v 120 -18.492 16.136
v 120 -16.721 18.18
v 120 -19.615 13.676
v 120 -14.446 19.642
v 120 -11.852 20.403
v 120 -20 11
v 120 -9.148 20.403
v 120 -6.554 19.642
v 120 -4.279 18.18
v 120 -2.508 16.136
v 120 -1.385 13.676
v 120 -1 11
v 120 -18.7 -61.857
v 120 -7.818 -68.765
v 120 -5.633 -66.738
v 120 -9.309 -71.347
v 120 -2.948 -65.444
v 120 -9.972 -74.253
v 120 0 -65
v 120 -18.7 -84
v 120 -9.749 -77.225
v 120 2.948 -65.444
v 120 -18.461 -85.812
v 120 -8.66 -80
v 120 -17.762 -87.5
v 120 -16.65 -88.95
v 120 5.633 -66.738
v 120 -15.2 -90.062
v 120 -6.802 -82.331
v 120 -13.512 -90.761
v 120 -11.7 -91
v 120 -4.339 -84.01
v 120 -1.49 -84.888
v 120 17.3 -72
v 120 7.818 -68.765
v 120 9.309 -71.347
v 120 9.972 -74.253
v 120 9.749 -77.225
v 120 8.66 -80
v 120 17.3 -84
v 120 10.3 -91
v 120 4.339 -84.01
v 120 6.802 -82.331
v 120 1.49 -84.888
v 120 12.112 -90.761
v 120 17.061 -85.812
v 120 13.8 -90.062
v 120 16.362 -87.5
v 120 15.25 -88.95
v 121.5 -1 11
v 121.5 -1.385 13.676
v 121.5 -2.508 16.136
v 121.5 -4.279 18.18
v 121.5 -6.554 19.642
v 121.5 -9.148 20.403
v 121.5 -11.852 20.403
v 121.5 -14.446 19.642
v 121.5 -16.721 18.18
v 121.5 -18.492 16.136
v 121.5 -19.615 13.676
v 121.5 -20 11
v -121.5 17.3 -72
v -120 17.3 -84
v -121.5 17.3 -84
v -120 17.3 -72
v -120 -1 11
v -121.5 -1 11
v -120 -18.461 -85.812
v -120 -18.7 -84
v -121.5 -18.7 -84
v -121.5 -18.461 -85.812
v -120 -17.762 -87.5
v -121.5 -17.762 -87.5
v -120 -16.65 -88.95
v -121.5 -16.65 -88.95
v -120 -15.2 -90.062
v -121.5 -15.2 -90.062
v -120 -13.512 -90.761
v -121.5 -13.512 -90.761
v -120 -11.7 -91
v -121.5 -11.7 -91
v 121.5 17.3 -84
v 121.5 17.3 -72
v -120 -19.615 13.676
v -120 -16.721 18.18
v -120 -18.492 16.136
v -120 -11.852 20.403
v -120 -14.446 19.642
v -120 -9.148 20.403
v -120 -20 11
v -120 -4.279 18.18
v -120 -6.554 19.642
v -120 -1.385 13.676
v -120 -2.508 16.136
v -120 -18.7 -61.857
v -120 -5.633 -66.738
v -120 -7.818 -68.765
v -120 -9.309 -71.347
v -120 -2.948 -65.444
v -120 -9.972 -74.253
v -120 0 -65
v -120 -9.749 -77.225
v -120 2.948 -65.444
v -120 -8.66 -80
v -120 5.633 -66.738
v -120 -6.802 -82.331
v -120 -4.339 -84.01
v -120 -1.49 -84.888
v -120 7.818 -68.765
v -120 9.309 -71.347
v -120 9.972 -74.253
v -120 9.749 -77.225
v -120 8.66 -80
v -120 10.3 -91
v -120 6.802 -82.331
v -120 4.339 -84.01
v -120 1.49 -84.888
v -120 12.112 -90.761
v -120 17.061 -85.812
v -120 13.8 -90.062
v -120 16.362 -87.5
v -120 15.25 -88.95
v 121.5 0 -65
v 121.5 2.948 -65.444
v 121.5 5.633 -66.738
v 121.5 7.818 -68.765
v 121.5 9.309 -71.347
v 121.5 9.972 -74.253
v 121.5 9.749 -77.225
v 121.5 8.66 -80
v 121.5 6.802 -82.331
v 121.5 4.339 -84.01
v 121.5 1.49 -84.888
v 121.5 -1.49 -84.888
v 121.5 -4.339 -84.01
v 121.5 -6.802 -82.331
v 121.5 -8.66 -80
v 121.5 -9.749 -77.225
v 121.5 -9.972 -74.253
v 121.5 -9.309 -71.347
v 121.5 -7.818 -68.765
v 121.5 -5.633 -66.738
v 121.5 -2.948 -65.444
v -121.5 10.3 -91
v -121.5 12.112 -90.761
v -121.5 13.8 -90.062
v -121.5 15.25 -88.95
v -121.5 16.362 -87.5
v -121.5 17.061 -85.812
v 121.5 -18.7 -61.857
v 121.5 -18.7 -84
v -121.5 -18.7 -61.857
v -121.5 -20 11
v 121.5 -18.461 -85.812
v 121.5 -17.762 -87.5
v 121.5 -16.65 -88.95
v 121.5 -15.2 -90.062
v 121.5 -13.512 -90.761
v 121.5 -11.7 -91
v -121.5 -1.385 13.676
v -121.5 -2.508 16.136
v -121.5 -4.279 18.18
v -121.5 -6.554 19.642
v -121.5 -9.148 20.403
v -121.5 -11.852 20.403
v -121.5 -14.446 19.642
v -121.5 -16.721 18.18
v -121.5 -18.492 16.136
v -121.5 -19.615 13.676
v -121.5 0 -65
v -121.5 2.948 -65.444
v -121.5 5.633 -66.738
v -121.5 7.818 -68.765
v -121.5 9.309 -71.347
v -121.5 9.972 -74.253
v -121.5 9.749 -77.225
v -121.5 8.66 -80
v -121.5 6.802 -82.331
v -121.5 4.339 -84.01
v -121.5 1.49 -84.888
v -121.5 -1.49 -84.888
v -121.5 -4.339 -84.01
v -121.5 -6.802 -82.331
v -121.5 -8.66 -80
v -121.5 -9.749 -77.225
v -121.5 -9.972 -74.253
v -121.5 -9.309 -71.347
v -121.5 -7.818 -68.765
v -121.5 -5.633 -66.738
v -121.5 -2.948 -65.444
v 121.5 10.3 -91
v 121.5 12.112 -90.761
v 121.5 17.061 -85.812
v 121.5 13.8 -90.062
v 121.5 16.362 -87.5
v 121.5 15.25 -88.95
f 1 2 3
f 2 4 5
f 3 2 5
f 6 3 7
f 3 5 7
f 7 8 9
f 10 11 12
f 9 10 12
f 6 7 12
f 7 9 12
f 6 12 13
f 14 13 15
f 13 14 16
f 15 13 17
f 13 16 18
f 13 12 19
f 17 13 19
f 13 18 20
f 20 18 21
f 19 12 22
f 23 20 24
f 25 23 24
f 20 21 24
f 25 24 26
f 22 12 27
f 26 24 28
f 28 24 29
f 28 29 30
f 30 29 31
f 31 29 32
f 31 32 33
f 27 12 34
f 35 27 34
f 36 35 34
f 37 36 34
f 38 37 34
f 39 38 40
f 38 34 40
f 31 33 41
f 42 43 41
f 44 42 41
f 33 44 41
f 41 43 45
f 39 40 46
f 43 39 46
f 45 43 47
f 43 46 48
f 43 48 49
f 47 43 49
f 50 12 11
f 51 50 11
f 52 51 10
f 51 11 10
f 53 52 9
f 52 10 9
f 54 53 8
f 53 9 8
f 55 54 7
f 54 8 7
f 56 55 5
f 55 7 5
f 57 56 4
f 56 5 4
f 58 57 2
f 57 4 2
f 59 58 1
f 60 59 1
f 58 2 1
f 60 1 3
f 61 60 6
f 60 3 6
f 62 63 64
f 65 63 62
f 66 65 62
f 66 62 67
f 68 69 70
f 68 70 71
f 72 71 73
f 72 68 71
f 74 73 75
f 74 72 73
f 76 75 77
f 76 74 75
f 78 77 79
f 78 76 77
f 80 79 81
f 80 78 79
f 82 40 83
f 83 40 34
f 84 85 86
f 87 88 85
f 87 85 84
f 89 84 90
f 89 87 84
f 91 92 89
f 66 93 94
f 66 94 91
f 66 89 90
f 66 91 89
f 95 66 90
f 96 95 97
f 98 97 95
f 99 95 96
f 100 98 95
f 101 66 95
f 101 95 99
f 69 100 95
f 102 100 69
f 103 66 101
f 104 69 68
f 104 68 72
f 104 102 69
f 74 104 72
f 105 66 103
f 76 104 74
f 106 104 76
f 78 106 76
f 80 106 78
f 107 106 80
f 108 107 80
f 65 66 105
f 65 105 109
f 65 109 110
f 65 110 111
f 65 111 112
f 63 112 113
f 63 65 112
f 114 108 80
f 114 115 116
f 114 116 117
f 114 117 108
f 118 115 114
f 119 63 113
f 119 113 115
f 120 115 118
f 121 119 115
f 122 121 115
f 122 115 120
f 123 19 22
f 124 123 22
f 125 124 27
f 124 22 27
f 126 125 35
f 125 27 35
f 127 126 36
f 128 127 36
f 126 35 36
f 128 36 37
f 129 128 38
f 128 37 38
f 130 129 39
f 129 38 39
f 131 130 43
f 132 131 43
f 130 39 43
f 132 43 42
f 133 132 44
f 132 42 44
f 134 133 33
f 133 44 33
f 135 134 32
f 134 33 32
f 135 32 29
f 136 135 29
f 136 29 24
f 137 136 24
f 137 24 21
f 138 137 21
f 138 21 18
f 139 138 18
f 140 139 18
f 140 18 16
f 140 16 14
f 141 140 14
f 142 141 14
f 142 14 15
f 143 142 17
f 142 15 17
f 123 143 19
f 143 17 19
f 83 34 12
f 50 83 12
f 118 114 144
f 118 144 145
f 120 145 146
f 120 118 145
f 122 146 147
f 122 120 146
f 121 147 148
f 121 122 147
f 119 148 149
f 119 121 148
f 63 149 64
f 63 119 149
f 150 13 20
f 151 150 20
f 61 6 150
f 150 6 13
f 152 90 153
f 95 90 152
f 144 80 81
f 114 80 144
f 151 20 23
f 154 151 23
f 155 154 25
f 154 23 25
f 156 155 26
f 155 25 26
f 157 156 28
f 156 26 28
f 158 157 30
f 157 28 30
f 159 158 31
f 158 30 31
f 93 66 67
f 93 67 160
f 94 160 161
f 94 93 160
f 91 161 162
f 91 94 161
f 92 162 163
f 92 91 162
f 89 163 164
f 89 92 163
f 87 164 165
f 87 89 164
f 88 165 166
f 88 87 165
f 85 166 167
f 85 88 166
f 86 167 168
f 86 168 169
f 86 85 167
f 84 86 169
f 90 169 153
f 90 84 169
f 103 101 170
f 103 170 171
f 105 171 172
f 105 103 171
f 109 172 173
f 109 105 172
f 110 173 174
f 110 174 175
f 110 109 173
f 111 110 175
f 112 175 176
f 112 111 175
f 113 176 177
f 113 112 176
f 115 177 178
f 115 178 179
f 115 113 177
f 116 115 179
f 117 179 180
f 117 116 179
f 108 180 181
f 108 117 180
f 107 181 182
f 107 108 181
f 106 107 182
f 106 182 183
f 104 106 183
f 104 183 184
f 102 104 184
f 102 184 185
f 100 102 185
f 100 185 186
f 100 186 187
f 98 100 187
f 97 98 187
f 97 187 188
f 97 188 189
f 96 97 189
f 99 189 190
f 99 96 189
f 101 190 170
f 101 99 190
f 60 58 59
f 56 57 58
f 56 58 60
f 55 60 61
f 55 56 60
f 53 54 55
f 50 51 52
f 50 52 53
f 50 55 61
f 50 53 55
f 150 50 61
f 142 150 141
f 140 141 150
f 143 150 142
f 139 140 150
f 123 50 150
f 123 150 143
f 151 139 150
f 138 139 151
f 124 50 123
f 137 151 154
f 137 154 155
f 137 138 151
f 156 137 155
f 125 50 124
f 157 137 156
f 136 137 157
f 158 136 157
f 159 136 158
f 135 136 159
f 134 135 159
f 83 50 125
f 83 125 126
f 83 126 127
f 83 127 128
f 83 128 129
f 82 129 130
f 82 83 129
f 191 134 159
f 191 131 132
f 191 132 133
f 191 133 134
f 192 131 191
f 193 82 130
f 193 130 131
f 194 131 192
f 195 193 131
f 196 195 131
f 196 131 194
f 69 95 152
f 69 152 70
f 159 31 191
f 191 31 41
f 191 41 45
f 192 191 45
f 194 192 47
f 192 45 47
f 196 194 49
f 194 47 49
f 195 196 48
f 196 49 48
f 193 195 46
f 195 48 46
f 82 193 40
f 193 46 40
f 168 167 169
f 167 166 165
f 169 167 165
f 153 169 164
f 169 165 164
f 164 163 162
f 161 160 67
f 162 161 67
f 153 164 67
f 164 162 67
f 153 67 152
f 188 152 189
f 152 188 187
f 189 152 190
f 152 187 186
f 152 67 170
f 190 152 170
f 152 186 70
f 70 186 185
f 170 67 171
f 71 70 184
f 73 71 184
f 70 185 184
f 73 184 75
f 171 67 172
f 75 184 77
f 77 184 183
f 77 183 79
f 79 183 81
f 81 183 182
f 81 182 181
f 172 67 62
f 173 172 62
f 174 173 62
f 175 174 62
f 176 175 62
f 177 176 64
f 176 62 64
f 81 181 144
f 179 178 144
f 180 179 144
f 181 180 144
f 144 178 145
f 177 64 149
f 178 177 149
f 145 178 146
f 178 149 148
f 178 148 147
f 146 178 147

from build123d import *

# Parameters (mm, degrees)
SKETCH1_R           = 10
BOSS_EXTRUDE1_DEPTH = 1.5


with BuildPart() as part:
    # Sketch1 → Boss-Extrude1 (new body)
    with BuildSketch(Plane.ZY.offset(120)):
        with BuildLine():
            Line((11, -20), (-61.85712101, -18.7))
            Line((-61.85712101, -18.7), (-84, -18.7))
            ThreePointArc((-84, -18.7), (-88.949747468, -16.649747468), (-91, -11.7))
            Line((-91, -11.7), (-91, 10.3))
            ThreePointArc((-91, 10.3), (-88.949747468, 15.249747468), (-84, 17.3))
            Line((-84, 17.3), (-72, 17.3))
            Line((-72, 17.3), (11, -1))
            ThreePointArc((11, -1), (20.5, -10.5), (11, -20))
        make_face()
        with Locations((-75, 0)):
            Circle(SKETCH1_R, mode=Mode.SUBTRACT)
    extrude(amount=BOSS_EXTRUDE1_DEPTH)


with BuildPart() as body_2:
    # Mirror2: mirrored copy
    add(part.part.mirror(Plane(origin=(0, 0, 0), x_dir=(0, 0, 1), z_dir=(1, 0, 0))))


solid = Compound([part.part, body_2.part])
